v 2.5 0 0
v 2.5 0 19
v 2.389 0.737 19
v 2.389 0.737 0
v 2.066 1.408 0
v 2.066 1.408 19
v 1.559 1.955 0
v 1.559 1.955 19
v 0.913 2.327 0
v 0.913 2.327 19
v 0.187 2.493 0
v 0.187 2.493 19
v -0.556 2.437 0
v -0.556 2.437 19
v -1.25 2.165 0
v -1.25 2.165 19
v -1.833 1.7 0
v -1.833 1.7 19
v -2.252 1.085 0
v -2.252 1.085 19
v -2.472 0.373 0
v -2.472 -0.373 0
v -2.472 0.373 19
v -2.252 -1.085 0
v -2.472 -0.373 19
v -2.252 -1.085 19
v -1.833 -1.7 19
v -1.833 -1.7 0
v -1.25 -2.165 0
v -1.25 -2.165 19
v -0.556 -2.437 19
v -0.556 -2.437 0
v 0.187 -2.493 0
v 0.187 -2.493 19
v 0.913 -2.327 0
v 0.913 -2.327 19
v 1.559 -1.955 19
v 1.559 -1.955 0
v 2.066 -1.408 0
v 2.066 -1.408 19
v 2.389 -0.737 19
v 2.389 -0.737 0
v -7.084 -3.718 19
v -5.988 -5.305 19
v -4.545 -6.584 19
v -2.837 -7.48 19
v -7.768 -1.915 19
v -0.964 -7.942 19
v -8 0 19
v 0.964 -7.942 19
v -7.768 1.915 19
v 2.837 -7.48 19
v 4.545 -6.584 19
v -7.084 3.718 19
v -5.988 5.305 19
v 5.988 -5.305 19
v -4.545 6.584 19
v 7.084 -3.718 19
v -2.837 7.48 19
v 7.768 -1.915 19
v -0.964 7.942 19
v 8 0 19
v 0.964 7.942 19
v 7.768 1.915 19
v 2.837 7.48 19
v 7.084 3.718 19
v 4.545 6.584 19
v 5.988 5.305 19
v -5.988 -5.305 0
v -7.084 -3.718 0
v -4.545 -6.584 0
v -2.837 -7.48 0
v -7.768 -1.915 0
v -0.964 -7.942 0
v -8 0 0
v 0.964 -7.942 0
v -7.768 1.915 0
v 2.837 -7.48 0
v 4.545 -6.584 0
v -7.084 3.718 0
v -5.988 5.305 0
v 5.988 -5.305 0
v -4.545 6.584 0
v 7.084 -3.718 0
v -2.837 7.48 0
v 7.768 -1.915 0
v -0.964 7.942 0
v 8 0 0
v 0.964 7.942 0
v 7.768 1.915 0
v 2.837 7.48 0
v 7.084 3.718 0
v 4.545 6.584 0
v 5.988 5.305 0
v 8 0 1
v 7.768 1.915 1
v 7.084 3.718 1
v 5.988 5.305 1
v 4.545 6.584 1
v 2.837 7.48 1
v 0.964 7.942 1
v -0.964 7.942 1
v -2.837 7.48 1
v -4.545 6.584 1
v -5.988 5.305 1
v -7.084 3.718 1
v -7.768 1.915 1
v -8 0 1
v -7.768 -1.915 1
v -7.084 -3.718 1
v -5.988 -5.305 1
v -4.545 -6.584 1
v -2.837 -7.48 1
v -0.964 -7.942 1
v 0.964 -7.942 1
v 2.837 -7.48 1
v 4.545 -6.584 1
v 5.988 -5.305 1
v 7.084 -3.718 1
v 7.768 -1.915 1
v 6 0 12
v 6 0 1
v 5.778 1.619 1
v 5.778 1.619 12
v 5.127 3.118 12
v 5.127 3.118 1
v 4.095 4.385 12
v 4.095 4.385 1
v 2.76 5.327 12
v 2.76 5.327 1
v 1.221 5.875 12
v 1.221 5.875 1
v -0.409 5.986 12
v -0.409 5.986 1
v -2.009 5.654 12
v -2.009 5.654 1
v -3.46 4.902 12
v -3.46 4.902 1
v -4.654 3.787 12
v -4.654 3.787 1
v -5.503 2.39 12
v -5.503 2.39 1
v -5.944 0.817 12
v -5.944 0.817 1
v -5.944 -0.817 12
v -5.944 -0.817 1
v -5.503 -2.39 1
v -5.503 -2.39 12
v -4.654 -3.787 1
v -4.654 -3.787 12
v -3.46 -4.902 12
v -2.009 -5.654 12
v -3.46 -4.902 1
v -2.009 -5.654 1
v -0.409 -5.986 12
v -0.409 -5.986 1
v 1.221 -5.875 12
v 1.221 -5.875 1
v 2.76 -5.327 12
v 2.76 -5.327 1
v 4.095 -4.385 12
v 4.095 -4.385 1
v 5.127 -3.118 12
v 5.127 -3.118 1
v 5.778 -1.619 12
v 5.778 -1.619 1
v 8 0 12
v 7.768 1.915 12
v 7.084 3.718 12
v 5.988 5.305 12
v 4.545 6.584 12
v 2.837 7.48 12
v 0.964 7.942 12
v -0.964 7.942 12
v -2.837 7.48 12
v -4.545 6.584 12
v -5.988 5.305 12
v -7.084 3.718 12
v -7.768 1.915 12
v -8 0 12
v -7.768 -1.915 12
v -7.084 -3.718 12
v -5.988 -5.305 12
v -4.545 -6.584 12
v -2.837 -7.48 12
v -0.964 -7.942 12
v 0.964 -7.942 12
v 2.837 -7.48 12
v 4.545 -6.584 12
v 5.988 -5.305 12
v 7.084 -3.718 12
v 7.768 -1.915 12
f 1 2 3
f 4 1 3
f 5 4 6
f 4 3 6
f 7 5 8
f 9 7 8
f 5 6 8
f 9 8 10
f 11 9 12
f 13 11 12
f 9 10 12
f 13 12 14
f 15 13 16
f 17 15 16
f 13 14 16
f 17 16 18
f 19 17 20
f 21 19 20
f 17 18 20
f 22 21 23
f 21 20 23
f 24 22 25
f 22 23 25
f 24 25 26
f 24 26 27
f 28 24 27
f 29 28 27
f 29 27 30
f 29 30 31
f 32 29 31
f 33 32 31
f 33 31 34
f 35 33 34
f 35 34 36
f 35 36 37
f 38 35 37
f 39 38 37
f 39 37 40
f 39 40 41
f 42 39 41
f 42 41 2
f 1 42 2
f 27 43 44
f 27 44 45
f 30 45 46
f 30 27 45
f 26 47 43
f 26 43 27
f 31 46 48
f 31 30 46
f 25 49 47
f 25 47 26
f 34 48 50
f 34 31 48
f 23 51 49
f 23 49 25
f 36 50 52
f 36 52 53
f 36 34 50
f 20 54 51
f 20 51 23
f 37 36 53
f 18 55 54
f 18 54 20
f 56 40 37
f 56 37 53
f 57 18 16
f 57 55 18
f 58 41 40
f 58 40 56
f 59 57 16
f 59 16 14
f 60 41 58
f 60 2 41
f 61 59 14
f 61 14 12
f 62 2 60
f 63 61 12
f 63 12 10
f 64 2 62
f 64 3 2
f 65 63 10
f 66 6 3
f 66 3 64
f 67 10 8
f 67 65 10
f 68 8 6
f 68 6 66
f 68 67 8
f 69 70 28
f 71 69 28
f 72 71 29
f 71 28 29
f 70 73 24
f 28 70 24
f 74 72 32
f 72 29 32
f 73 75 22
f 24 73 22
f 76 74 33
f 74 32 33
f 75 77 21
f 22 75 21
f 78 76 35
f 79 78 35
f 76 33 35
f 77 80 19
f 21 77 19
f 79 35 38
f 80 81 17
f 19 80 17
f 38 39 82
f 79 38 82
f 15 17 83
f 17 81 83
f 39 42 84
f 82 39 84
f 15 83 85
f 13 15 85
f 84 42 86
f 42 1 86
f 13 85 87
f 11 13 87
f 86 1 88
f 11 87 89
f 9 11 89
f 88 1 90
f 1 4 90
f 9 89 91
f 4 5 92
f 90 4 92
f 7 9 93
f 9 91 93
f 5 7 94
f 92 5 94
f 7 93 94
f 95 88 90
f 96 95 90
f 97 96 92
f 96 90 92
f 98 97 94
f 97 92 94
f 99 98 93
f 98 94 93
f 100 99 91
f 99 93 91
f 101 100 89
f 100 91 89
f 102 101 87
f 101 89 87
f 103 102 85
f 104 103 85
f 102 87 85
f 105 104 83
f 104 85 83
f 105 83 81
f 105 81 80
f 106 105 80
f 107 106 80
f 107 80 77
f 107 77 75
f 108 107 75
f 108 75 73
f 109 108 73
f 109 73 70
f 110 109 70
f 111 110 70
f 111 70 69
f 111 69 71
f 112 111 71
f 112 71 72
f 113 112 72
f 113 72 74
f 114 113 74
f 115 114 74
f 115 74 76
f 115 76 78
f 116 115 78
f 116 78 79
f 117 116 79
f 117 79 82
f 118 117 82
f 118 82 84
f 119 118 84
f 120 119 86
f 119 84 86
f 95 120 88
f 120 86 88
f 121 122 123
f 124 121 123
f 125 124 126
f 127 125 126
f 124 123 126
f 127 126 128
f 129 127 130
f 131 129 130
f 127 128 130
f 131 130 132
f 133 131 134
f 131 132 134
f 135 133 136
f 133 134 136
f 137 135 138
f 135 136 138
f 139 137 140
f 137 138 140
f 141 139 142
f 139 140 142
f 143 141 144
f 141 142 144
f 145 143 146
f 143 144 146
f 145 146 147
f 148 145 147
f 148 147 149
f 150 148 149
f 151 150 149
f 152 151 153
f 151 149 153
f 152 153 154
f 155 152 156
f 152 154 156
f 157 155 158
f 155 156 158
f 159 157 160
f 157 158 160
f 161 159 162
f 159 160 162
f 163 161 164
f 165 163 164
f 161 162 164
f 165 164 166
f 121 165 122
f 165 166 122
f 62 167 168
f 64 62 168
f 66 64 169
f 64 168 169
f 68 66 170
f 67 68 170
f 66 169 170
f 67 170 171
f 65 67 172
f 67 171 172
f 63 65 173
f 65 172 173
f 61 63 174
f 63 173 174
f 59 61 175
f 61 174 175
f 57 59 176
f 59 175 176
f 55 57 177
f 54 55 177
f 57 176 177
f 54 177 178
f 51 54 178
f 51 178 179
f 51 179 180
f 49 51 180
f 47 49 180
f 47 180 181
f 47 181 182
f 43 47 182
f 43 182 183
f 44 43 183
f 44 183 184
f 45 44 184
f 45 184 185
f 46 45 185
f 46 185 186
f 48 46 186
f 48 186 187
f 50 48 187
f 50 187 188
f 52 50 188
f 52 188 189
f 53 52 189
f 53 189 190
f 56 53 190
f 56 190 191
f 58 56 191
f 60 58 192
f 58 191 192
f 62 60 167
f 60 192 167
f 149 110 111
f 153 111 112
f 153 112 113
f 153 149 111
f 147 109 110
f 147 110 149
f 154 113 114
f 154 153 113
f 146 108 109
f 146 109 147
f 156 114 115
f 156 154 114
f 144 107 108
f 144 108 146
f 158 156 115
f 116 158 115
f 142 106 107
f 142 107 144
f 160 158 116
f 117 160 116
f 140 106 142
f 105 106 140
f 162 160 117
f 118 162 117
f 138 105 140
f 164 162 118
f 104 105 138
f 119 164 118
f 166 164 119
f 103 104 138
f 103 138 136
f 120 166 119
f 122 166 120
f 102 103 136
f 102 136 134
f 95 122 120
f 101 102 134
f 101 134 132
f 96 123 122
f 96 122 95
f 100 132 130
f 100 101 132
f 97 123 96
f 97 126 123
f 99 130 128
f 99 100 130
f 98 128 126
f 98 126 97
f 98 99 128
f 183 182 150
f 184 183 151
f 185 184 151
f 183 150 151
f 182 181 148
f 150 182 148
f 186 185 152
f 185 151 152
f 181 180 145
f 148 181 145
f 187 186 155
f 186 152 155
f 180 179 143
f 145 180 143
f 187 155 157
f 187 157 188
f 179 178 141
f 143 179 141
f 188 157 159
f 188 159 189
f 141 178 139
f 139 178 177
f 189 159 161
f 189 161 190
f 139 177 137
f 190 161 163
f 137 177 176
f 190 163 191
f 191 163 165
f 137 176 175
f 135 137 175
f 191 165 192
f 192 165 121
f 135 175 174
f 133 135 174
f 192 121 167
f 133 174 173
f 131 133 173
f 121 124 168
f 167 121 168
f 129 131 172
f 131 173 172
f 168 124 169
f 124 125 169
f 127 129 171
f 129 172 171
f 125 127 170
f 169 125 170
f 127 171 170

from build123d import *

# Parameters (mm, degrees)
SKETCH_1_R          = 8
EXTRUDE_1_DEPTH     = 19
CUT_EXTRUDE_START   = -18
SKETCH_2_R          = 8
SKETCH_2_R_2        = 6
CUT_EXTRUDE_3_DEPTH = 11
SKETCH_3_R          = 2.5
CUT_EXTRUDE_4_DEPTH = 23.113344387


with BuildPart() as part:
    # 草图1 → 凸台-拉伸1 (new body)
    with BuildSketch(Plane.XY):
        Circle(SKETCH_1_R)
    extrude(amount=EXTRUDE_1_DEPTH)

    # 草图2 → 切除-拉伸3 (cut)
    with BuildSketch(Plane.XY.offset(19).offset(CUT_EXTRUDE_START)):
        Circle(SKETCH_2_R)
        Circle(SKETCH_2_R_2, mode=Mode.SUBTRACT)
    extrude(amount=CUT_EXTRUDE_3_DEPTH, mode=Mode.SUBTRACT)

    # 草图3 → 切除-拉伸4 (cut, through all)
    with BuildSketch(Plane.XY.offset(19)):
        Circle(SKETCH_3_R)
    extrude(amount=-CUT_EXTRUDE_4_DEPTH, mode=Mode.SUBTRACT)


solid = part.part
